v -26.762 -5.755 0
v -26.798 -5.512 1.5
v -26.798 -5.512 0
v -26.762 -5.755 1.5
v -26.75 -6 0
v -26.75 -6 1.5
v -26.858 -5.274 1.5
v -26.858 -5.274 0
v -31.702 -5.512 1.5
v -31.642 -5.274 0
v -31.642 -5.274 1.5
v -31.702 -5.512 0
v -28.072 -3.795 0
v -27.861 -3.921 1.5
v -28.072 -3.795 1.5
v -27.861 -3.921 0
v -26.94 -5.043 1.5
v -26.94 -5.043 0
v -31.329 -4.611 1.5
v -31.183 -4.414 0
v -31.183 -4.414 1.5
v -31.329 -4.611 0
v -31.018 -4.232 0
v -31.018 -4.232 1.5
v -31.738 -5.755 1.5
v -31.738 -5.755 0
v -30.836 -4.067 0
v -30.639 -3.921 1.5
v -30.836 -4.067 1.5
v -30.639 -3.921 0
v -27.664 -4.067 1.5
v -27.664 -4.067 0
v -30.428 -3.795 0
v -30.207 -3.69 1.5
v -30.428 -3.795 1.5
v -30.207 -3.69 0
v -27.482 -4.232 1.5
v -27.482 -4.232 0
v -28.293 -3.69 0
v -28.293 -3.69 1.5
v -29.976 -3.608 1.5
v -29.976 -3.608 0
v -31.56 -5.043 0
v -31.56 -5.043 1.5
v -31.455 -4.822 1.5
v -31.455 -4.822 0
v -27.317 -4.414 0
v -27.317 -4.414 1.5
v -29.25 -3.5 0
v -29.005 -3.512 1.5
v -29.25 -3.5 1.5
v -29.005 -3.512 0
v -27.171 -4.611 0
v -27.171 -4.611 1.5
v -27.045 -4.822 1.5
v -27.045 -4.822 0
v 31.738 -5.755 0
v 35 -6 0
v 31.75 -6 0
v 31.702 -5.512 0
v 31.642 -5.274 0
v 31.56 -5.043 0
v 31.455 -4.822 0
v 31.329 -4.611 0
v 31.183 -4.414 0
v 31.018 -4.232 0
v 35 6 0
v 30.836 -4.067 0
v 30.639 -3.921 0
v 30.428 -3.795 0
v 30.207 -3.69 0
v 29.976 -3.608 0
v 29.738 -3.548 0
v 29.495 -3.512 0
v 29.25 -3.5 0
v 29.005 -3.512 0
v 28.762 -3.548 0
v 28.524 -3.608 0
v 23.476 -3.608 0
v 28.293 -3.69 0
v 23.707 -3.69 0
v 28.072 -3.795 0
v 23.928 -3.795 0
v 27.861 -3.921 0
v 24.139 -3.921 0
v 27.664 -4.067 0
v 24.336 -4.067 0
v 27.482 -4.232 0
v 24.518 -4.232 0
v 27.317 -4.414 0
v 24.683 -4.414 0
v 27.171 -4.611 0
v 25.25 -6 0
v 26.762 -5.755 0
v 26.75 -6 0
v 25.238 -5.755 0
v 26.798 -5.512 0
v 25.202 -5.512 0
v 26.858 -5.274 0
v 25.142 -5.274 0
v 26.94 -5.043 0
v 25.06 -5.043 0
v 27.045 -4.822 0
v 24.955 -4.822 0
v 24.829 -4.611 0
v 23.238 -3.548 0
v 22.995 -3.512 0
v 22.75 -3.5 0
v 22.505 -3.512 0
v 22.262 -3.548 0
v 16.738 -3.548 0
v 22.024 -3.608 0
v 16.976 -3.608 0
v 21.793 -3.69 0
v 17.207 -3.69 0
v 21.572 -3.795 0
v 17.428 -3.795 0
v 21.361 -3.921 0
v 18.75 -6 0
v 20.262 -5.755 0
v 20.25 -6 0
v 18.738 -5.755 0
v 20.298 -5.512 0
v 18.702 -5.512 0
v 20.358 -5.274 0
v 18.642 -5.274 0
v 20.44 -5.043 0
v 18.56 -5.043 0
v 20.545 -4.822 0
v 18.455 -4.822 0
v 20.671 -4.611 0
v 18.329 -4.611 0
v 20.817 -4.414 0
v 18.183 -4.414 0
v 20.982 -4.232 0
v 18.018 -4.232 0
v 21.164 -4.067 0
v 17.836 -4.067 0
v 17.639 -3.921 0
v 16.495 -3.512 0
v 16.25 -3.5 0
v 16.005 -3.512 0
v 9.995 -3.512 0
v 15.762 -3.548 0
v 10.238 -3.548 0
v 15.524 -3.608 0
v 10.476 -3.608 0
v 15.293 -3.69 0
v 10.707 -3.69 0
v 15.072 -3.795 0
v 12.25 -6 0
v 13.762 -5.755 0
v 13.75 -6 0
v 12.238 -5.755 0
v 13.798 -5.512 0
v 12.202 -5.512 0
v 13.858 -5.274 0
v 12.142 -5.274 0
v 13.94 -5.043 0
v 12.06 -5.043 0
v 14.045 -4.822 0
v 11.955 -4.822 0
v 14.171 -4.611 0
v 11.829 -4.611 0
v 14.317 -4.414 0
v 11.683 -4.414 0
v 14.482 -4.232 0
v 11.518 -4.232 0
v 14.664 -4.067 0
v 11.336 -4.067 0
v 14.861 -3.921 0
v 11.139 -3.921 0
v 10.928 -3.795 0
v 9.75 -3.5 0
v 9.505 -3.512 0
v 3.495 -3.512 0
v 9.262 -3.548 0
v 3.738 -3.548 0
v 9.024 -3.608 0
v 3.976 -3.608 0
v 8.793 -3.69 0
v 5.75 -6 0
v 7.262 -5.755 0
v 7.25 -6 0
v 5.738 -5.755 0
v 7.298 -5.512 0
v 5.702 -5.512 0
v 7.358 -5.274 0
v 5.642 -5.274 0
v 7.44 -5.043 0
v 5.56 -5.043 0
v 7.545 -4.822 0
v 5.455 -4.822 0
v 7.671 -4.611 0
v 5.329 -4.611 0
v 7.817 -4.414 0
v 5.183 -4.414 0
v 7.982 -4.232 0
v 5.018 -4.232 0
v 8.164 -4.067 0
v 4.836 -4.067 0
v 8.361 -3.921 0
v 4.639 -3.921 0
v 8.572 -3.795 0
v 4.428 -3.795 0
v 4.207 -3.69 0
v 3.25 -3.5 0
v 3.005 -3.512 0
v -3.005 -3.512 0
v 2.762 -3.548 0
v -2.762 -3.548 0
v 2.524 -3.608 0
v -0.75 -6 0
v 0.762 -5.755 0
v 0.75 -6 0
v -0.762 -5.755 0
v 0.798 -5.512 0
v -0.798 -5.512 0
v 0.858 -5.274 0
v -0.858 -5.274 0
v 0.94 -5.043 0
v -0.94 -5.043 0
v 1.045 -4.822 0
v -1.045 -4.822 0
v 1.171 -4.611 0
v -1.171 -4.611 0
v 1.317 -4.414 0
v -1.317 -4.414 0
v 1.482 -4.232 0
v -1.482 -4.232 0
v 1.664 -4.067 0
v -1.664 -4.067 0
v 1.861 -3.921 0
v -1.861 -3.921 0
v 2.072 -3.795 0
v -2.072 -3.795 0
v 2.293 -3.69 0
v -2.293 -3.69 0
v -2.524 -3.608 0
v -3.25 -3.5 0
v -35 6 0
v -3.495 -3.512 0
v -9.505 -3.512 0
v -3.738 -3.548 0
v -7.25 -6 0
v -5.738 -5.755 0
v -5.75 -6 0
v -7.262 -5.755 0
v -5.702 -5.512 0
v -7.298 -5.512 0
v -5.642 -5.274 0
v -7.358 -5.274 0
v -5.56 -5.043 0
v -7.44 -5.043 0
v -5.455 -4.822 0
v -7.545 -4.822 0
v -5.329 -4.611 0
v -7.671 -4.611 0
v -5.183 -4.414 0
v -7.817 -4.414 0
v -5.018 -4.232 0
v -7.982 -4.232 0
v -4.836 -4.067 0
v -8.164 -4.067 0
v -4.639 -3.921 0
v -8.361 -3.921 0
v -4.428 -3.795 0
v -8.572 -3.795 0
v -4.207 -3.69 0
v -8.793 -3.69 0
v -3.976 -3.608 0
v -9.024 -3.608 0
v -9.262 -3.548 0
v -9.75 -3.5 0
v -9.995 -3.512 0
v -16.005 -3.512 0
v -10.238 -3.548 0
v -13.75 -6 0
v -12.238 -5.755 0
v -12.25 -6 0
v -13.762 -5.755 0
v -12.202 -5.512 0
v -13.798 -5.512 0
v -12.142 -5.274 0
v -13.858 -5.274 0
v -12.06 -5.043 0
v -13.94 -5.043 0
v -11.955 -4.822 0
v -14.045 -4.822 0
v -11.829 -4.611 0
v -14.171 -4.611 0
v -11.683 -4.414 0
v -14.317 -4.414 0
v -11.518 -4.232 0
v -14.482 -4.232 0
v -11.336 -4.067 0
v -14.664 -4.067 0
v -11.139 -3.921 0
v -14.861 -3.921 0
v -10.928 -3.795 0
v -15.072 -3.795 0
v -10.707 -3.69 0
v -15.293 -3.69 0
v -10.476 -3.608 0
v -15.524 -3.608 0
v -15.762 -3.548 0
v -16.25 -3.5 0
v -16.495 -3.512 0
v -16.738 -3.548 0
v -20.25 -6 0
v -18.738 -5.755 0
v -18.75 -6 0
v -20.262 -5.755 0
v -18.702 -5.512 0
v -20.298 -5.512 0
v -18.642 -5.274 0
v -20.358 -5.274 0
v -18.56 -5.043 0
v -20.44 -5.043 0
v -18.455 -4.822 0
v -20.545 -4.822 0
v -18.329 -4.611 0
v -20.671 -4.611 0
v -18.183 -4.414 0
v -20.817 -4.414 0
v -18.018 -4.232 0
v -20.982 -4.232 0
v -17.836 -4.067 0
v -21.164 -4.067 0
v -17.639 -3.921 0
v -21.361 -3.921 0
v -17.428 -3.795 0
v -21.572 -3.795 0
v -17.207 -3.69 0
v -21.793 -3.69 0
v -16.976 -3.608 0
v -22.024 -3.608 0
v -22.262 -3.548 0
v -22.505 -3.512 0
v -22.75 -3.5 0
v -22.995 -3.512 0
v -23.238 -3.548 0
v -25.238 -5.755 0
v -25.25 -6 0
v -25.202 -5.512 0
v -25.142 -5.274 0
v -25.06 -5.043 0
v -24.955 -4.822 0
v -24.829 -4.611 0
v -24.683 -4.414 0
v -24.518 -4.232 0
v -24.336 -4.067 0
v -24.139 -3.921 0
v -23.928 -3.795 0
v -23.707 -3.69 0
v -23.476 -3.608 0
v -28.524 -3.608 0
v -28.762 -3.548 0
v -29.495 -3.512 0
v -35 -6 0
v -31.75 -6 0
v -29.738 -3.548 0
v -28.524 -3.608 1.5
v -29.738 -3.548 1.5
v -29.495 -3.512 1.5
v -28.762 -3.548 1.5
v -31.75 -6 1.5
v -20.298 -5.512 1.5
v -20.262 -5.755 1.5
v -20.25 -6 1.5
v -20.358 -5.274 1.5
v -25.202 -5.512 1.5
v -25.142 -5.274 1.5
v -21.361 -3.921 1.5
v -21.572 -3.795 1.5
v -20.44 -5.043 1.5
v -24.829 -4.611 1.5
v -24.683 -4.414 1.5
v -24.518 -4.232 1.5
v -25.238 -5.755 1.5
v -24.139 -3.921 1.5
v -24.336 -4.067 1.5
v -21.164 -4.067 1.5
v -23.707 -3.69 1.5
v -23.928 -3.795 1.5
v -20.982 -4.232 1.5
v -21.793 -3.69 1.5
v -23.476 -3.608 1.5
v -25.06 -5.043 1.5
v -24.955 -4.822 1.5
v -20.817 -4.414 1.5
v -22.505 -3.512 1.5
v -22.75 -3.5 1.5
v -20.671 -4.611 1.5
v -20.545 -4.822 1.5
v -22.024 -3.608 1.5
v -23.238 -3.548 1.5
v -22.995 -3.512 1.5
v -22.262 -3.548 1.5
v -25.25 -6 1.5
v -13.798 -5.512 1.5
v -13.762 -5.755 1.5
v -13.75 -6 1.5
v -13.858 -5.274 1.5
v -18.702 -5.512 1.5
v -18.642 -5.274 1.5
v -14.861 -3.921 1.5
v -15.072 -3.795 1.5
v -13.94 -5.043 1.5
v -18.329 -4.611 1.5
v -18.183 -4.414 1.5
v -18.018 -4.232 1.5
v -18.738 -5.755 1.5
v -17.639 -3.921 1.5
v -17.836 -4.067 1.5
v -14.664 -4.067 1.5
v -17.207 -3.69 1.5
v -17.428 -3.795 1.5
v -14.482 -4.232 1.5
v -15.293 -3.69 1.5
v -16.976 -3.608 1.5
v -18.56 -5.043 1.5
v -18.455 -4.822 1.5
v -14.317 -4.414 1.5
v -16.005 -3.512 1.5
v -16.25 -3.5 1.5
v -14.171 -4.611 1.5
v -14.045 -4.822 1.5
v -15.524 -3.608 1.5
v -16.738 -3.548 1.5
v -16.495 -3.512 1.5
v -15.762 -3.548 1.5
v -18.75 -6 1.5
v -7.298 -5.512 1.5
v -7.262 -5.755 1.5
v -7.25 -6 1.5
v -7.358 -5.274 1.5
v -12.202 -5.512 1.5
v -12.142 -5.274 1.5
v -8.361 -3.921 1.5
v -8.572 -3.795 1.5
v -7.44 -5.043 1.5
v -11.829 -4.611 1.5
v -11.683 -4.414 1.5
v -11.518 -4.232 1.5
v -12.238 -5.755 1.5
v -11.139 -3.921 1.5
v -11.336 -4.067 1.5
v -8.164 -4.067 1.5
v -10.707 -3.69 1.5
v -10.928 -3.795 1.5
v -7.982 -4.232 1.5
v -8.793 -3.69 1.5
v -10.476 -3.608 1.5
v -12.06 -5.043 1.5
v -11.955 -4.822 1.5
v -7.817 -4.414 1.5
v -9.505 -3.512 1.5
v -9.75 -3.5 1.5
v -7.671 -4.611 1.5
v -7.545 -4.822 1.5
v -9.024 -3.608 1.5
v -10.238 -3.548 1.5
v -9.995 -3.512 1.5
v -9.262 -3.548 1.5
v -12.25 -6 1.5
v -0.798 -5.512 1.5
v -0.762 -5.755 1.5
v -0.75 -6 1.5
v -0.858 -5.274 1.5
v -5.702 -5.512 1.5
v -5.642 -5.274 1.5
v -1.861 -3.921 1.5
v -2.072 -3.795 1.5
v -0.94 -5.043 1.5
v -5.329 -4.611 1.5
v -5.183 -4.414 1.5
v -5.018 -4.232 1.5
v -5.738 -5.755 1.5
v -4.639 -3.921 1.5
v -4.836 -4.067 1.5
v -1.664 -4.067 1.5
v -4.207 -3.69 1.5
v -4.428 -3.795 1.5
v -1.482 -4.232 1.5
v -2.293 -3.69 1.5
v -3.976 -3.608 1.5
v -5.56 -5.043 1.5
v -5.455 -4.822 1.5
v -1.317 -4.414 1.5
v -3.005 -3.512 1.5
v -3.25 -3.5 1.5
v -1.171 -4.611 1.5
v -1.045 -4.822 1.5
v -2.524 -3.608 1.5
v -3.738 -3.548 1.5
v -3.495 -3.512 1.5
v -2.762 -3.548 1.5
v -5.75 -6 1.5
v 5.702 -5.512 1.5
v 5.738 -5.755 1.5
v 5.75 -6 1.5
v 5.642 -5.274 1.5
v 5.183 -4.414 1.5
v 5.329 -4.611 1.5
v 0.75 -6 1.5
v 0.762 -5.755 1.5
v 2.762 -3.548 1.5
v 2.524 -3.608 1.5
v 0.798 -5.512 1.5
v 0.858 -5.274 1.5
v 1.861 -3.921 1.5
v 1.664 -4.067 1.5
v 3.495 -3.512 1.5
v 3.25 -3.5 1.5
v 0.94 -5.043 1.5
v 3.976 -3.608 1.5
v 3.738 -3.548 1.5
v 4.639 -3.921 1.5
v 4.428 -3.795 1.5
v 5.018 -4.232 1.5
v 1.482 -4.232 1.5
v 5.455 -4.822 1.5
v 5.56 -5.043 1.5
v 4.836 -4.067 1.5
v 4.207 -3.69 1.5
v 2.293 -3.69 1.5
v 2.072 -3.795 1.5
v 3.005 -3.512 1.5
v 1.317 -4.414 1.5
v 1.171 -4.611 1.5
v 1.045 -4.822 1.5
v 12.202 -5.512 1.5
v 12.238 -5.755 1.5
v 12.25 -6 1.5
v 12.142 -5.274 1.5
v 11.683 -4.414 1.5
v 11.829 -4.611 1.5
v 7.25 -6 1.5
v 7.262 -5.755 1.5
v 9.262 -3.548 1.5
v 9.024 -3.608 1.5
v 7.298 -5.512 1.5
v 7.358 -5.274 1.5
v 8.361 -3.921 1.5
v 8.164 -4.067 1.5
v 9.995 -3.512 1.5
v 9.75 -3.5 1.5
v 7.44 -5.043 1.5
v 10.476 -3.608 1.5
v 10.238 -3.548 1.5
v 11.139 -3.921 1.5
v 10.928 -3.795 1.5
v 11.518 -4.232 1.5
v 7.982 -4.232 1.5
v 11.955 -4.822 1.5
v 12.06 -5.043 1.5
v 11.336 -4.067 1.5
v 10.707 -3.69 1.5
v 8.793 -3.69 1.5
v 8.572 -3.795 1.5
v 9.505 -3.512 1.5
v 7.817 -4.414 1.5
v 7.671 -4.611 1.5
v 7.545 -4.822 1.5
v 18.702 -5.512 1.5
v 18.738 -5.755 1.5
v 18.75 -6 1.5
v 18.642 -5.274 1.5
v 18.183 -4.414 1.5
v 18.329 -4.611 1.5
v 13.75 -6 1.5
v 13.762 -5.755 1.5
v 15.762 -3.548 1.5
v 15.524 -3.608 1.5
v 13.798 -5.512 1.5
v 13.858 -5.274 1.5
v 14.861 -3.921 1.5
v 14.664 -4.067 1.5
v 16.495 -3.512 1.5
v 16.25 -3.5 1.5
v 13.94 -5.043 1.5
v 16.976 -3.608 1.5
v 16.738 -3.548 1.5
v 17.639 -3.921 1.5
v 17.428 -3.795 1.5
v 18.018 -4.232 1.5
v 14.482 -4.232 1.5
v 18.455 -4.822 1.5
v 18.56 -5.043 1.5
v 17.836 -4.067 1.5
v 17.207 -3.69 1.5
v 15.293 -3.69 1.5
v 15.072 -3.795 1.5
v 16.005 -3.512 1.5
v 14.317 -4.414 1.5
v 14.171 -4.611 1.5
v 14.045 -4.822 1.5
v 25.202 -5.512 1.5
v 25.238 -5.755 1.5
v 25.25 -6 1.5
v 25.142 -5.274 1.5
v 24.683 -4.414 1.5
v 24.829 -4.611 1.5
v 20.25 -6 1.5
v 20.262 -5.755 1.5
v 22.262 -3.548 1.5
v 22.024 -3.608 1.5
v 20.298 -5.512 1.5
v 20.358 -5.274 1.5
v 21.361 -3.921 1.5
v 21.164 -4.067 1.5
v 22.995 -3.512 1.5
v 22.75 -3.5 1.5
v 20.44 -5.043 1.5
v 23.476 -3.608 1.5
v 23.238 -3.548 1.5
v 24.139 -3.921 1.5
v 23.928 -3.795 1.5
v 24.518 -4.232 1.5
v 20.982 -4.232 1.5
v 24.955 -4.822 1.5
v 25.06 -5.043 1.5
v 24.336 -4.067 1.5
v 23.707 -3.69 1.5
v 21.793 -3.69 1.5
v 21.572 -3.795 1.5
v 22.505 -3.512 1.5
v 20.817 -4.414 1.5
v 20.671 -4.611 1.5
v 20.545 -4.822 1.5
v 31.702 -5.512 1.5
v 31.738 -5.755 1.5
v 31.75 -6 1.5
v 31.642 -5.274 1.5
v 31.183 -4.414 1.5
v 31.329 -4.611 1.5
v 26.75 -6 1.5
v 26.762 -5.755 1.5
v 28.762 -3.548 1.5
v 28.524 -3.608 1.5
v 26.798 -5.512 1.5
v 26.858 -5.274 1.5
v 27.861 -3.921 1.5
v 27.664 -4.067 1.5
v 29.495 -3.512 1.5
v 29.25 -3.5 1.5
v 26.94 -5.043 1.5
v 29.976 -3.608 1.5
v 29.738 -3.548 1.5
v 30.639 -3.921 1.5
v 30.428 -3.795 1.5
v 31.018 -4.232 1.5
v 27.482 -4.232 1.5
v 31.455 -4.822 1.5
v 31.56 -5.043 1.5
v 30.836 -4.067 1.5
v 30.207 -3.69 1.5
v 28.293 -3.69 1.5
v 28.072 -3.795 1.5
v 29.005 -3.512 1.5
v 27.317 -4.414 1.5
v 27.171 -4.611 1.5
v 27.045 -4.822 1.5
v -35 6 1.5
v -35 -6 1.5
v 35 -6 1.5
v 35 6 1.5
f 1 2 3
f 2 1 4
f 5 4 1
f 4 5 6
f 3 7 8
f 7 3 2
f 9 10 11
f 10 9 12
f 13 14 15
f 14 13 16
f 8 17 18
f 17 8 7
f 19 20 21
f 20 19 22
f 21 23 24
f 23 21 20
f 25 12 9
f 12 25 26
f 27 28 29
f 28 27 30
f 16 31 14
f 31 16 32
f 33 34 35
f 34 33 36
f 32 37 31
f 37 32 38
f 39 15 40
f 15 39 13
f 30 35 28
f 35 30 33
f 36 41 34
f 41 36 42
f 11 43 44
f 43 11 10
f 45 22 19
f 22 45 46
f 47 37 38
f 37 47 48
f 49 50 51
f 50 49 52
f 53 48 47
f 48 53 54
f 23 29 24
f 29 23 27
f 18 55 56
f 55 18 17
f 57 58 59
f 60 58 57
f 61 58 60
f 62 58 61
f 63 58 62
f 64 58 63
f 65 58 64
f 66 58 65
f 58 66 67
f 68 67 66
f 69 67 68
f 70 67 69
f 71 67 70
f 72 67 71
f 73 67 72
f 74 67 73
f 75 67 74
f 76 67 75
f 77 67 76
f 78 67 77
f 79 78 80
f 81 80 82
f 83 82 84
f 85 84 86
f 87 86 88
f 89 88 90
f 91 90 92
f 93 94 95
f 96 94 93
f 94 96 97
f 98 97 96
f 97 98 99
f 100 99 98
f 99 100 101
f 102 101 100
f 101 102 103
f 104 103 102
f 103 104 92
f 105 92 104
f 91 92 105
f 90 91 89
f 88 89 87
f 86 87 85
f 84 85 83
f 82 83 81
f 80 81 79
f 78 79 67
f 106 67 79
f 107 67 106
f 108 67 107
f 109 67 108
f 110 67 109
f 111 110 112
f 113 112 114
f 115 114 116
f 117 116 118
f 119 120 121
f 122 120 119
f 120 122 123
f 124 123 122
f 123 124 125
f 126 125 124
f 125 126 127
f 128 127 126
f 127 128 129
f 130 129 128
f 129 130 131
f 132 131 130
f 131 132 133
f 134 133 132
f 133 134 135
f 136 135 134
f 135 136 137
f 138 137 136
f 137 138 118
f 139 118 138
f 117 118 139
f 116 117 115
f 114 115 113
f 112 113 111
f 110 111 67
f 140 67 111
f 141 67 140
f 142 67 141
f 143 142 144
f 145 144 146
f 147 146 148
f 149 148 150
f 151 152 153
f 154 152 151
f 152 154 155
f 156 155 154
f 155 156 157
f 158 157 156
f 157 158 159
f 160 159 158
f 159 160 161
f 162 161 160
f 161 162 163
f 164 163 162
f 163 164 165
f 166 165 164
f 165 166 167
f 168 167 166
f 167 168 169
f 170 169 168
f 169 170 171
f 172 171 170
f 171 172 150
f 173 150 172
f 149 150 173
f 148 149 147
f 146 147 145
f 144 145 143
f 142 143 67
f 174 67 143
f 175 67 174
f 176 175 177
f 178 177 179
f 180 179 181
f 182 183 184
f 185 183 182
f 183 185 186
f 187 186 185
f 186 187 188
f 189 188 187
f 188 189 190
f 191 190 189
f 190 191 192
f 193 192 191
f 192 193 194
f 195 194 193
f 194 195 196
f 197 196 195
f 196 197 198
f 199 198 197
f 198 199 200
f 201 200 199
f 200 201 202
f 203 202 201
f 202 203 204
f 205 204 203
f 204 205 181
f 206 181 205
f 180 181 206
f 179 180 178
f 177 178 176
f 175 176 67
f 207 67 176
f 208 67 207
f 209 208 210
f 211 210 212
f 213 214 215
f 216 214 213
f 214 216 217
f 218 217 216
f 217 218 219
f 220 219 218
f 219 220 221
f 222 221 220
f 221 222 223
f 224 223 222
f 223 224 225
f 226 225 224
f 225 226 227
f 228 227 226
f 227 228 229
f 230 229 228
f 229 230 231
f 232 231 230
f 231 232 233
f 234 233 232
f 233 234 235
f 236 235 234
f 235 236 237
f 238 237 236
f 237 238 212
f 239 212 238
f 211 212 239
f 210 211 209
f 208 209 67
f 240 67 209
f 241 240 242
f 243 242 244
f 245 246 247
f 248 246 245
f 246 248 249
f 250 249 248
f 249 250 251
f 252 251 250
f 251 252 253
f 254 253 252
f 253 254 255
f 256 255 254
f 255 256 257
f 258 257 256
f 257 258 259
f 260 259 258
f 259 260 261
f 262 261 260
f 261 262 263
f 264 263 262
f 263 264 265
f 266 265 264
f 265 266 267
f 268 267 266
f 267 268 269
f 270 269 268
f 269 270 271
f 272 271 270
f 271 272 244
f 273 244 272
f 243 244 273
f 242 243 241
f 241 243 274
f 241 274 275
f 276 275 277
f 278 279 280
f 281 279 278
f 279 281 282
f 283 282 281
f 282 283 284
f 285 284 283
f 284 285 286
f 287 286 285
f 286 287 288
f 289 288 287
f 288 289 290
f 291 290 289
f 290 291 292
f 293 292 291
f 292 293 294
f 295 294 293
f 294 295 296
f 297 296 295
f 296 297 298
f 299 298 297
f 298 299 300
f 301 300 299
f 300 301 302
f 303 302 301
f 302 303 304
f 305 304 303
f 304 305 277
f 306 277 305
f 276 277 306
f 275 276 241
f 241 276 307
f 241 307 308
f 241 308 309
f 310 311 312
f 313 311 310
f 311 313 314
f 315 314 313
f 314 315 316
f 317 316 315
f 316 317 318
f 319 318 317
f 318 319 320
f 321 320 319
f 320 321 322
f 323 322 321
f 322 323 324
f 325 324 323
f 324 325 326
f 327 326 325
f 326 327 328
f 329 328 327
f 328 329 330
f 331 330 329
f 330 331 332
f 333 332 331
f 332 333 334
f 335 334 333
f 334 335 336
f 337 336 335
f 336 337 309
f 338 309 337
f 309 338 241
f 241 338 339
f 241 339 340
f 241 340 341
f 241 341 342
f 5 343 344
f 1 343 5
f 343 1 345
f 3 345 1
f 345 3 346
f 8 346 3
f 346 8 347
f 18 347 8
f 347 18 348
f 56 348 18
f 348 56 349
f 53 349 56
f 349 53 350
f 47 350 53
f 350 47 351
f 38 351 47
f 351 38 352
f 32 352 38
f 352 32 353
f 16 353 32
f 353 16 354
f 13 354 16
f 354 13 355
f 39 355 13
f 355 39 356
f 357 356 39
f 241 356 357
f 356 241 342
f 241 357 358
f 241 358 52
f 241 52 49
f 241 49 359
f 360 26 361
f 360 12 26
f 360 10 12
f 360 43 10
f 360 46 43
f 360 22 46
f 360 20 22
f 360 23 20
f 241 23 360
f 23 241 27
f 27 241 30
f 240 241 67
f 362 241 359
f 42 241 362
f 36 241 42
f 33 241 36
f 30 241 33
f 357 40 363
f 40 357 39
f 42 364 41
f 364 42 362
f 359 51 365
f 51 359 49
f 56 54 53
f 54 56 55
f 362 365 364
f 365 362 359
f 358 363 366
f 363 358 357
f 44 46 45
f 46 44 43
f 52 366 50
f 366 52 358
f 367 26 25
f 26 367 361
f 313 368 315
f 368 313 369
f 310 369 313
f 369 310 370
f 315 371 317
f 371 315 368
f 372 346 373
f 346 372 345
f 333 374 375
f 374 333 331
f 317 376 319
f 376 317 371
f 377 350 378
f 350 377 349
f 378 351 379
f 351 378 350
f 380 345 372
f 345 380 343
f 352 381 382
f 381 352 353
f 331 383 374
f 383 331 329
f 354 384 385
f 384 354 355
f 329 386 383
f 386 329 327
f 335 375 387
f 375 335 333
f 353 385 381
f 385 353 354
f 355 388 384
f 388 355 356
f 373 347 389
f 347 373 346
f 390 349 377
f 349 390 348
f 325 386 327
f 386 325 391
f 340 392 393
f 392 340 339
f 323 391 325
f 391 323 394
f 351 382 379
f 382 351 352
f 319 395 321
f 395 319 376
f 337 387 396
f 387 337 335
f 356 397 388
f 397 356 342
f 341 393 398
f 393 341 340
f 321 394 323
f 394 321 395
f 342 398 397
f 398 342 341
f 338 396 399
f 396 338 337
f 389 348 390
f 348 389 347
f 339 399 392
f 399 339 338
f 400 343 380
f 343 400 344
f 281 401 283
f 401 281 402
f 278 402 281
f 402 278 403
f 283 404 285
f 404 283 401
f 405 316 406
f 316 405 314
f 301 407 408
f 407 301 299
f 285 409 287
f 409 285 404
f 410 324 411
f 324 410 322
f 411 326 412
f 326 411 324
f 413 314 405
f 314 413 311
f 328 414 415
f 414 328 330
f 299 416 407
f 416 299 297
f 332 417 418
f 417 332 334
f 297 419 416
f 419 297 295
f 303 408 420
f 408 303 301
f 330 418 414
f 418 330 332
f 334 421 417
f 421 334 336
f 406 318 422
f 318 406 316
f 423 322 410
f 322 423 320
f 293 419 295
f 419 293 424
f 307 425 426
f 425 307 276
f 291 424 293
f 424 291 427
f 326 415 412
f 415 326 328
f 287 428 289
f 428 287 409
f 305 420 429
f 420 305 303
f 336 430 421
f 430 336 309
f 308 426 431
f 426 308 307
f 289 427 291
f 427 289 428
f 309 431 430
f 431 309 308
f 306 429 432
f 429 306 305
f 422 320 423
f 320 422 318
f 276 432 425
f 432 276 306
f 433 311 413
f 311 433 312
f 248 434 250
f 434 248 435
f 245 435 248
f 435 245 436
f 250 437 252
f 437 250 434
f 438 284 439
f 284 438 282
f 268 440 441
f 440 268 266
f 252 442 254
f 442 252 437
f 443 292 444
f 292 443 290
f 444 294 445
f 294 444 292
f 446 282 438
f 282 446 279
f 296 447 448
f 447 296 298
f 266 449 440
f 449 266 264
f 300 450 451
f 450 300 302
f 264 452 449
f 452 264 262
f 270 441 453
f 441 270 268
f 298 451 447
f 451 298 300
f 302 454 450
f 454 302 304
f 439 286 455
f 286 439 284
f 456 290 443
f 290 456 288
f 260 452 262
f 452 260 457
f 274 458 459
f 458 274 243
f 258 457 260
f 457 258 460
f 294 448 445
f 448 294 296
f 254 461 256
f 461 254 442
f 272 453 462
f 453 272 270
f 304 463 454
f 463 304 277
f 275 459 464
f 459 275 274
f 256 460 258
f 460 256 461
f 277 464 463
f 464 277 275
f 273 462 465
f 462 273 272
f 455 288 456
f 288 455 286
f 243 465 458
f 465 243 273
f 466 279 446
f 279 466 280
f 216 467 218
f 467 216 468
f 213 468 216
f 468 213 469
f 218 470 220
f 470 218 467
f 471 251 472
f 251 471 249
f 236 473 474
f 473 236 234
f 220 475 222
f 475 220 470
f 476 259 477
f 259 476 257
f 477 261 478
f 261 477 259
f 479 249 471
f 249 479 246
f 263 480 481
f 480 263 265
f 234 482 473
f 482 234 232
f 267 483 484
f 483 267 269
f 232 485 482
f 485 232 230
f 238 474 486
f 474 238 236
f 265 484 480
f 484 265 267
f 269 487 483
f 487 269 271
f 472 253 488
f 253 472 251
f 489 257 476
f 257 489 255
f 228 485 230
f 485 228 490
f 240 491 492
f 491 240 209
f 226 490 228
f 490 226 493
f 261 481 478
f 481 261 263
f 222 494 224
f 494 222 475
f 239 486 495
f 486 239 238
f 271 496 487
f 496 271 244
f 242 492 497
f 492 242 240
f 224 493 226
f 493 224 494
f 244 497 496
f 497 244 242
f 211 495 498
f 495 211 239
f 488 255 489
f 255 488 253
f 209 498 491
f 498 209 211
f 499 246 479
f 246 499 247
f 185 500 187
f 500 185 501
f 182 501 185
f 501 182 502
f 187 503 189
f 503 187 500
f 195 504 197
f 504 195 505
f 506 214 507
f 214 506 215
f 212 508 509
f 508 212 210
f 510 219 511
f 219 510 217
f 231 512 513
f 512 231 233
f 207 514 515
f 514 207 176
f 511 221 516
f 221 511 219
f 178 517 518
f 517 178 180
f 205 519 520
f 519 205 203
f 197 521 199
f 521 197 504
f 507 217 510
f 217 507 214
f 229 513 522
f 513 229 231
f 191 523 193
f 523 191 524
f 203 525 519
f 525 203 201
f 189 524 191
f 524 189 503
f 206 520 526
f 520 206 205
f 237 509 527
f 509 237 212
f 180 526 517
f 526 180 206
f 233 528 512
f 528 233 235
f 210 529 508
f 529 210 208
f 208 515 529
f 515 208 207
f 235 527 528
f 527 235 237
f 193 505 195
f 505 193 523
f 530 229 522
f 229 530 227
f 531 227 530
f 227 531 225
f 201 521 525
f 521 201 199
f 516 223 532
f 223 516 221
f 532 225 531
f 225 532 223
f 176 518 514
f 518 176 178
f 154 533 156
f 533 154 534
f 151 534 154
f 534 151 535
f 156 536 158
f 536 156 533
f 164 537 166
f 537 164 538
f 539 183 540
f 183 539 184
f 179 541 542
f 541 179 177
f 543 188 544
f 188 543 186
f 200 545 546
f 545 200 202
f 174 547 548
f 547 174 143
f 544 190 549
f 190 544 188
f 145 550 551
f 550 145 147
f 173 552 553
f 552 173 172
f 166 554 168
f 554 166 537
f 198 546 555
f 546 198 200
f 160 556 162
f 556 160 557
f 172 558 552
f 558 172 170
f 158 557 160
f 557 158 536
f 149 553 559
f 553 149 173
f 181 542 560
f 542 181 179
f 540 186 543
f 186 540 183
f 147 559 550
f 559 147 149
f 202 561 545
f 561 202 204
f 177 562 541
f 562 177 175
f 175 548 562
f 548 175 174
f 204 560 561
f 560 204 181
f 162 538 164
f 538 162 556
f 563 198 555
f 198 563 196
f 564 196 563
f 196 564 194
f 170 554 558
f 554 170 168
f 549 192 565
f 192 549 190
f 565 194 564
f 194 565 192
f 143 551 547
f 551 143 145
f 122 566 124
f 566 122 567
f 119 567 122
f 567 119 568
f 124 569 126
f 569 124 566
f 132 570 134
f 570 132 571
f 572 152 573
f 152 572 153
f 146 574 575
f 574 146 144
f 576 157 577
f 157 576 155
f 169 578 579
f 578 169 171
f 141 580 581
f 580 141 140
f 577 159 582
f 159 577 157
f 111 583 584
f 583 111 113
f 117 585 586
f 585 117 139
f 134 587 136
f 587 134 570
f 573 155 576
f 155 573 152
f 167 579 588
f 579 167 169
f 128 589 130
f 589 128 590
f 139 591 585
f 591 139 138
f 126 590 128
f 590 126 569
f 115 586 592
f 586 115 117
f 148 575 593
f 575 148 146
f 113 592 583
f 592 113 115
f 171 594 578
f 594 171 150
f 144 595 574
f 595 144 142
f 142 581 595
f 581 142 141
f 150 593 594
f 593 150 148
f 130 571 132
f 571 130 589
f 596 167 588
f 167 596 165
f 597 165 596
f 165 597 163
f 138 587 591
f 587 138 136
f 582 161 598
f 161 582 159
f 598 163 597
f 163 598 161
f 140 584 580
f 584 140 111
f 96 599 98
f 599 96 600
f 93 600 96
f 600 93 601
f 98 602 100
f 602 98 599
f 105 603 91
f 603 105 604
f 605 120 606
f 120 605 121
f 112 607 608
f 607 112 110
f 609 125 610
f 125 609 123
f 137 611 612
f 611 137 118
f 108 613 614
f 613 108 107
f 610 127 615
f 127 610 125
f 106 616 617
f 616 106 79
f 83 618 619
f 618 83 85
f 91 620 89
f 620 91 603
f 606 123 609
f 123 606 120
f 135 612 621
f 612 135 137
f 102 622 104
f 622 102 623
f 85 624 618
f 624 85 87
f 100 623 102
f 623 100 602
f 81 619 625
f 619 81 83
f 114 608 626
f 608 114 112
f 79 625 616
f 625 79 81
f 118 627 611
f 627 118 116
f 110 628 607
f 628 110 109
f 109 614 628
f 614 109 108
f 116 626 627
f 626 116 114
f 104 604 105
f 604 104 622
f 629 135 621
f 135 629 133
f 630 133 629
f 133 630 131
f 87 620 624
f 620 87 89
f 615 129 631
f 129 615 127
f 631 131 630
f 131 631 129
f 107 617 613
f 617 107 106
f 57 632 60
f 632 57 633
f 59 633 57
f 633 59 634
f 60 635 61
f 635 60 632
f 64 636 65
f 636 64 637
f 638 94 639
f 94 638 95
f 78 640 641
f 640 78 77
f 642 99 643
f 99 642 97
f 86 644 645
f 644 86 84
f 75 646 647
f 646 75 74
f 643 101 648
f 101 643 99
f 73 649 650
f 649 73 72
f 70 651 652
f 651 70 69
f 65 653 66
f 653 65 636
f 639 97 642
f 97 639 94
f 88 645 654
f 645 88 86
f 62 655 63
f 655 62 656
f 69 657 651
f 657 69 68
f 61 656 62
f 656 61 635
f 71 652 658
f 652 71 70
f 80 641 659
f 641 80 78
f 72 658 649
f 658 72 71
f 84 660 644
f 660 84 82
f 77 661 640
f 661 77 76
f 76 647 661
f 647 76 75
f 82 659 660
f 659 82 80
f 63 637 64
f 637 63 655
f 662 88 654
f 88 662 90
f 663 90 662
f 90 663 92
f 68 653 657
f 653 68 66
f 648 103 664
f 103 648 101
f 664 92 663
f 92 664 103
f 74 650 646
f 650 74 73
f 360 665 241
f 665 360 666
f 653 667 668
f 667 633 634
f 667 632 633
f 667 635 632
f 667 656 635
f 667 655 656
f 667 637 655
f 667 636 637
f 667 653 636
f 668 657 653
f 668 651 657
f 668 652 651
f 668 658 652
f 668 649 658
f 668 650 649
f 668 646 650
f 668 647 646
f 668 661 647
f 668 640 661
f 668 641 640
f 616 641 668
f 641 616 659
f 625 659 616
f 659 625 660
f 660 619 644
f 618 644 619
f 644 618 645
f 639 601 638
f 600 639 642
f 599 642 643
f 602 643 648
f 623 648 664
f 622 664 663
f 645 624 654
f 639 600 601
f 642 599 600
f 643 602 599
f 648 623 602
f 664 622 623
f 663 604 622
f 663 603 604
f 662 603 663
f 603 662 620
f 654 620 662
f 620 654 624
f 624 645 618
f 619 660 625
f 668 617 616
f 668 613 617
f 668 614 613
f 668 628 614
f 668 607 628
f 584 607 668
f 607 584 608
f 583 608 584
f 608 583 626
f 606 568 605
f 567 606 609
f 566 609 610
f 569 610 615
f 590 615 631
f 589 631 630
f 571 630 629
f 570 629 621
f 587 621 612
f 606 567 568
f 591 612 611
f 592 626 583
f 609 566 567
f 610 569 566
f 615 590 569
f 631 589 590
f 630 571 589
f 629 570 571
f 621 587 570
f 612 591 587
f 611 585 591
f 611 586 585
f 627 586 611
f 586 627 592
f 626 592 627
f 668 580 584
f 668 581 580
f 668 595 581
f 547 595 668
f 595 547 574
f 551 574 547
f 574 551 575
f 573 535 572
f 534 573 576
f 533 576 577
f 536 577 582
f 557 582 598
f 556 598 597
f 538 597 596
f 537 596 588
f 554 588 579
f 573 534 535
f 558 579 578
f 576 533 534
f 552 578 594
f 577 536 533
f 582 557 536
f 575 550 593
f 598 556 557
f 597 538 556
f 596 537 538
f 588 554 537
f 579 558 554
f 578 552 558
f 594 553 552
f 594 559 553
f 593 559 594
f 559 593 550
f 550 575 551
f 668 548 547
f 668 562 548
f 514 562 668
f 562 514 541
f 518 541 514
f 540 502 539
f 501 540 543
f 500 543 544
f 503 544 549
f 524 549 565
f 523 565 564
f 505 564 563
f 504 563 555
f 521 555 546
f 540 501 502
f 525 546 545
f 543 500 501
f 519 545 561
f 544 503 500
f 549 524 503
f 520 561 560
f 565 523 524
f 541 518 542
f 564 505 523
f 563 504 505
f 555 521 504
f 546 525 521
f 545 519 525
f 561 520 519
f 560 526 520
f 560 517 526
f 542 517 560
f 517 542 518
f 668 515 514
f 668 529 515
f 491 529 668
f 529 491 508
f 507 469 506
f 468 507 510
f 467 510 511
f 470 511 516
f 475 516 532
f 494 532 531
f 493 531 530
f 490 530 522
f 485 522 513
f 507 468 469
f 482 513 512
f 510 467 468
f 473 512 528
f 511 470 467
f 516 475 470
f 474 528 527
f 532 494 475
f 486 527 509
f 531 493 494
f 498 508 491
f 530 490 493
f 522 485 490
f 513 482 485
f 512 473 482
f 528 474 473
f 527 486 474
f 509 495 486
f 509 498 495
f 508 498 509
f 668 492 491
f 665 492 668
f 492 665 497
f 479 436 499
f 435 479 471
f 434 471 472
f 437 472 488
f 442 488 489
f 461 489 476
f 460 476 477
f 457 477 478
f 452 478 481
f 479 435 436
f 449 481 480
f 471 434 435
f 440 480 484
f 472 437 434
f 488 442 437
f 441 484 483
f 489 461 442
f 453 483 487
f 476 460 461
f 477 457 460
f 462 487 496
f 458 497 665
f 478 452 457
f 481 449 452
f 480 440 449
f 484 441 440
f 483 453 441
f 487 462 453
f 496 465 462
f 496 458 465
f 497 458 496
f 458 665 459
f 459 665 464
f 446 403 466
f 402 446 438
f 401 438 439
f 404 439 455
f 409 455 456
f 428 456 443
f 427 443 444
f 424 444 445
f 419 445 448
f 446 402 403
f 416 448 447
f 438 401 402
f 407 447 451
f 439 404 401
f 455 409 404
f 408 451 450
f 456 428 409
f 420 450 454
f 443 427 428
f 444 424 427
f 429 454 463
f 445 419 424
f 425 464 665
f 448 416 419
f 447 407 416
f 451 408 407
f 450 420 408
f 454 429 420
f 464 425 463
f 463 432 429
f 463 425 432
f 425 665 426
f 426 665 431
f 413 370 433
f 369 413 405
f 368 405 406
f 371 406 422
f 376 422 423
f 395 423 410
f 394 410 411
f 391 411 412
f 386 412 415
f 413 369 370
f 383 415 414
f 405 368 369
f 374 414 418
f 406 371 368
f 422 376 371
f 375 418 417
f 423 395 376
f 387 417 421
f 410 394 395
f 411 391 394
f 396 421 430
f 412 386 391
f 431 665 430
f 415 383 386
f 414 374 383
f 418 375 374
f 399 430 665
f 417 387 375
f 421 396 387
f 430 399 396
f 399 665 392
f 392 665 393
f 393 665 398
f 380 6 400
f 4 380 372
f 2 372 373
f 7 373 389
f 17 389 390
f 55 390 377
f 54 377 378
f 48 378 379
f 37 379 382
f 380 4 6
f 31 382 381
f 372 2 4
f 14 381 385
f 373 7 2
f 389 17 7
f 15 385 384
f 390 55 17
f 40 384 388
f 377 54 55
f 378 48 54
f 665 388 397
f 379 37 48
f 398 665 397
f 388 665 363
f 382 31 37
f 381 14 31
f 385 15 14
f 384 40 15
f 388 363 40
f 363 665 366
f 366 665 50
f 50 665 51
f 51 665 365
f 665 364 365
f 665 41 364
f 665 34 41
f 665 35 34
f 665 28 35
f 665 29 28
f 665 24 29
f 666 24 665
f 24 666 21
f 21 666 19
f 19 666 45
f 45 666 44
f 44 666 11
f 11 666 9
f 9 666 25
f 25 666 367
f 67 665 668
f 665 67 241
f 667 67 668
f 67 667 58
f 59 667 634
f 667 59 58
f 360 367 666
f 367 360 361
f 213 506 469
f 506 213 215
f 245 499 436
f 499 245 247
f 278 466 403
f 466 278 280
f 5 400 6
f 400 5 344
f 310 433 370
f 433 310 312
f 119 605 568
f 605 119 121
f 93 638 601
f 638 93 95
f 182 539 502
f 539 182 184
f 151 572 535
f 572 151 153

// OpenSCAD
// 10-well agarose gel comb - flat plate with spine and hanging teeth.
// Orientation: Lying flat on XY plane, spine along X, teeth hanging in -Y.

// Dimensions
spine_len = 70;
spine_w   = 12;
plate_thk = 1.5;

tooth_w   = 5.0;
tooth_len = 12;
tooth_gap = 1.5;
n_teeth   = 10;

$fn = 64;

// Calculate total width of the tooth row
tooth_row_w = n_teeth * tooth_w + (n_teeth - 1) * tooth_gap;

// Position the tooth row so it is centred on the spine in X
// The spine is from -spine_len/2 to +spine_len/2.
// The tooth row is centred at X=0.
// The teeth hang in -Y direction from the spine edge at Y = -spine_w/2.
// So the top of the teeth is at Y = -spine_w/2.
// The bottom of the teeth is at Y = -spine_w/2 - tooth_len.

// Define the 2D profile for the spine (a rectangle)
// We will extrude this to get the base plate.
// Spine profile: width = spine_w, height = plate_thk.
// Centred at origin.
spine_profile = [spine_w / 2, plate_thk / 2];

// Define the 2D profile for the teeth relative to the spine edge.
// We will subtract these from the extruded spine.
// Tooth profile: width = tooth_w, height = tooth_len.
// Positioned at X = 0, Y = -spine_w/2 (top edge of spine).
// We need to generate the list of tooth positions.

// Generate X positions for the teeth, centred on 0
// Formula: (i - (n-1)/2) * (tooth_w + tooth_gap)
tooth_positions = [for (i = [0 : n_teeth - 1]) let(pos = (i - (n_teeth - 1) / 2) * (tooth_w + tooth_gap)) pos];

difference() {
    // 1. Create the main spine plate
    // Extrude the spine rectangle to the full thickness
    translate([0, 0, 0])
    linear_extrude(height = plate_thk)
    square([spine_len, spine_w], center = true);

    // 2. Cut out the teeth
    // We subtract cylinders (or extruded rectangles) for each tooth.
    // The teeth hang down from the top edge of the spine (which is at Y = -spine_w/2).
    // The cut shape needs to extend slightly past the bottom of the teeth to ensure clean separation.
    cut_depth = tooth_len + 0.1;
    cut_y_start = -spine_w / 2; // Top of the spine
    cut_y_end   = cut_y_start - cut_depth; // Bottom of the cut

    for (x = tooth_positions) {
        translate([x, cut_y_start, 0])
        cylinder(h = cut_depth + 0.1, d = tooth_w);
    }
}
